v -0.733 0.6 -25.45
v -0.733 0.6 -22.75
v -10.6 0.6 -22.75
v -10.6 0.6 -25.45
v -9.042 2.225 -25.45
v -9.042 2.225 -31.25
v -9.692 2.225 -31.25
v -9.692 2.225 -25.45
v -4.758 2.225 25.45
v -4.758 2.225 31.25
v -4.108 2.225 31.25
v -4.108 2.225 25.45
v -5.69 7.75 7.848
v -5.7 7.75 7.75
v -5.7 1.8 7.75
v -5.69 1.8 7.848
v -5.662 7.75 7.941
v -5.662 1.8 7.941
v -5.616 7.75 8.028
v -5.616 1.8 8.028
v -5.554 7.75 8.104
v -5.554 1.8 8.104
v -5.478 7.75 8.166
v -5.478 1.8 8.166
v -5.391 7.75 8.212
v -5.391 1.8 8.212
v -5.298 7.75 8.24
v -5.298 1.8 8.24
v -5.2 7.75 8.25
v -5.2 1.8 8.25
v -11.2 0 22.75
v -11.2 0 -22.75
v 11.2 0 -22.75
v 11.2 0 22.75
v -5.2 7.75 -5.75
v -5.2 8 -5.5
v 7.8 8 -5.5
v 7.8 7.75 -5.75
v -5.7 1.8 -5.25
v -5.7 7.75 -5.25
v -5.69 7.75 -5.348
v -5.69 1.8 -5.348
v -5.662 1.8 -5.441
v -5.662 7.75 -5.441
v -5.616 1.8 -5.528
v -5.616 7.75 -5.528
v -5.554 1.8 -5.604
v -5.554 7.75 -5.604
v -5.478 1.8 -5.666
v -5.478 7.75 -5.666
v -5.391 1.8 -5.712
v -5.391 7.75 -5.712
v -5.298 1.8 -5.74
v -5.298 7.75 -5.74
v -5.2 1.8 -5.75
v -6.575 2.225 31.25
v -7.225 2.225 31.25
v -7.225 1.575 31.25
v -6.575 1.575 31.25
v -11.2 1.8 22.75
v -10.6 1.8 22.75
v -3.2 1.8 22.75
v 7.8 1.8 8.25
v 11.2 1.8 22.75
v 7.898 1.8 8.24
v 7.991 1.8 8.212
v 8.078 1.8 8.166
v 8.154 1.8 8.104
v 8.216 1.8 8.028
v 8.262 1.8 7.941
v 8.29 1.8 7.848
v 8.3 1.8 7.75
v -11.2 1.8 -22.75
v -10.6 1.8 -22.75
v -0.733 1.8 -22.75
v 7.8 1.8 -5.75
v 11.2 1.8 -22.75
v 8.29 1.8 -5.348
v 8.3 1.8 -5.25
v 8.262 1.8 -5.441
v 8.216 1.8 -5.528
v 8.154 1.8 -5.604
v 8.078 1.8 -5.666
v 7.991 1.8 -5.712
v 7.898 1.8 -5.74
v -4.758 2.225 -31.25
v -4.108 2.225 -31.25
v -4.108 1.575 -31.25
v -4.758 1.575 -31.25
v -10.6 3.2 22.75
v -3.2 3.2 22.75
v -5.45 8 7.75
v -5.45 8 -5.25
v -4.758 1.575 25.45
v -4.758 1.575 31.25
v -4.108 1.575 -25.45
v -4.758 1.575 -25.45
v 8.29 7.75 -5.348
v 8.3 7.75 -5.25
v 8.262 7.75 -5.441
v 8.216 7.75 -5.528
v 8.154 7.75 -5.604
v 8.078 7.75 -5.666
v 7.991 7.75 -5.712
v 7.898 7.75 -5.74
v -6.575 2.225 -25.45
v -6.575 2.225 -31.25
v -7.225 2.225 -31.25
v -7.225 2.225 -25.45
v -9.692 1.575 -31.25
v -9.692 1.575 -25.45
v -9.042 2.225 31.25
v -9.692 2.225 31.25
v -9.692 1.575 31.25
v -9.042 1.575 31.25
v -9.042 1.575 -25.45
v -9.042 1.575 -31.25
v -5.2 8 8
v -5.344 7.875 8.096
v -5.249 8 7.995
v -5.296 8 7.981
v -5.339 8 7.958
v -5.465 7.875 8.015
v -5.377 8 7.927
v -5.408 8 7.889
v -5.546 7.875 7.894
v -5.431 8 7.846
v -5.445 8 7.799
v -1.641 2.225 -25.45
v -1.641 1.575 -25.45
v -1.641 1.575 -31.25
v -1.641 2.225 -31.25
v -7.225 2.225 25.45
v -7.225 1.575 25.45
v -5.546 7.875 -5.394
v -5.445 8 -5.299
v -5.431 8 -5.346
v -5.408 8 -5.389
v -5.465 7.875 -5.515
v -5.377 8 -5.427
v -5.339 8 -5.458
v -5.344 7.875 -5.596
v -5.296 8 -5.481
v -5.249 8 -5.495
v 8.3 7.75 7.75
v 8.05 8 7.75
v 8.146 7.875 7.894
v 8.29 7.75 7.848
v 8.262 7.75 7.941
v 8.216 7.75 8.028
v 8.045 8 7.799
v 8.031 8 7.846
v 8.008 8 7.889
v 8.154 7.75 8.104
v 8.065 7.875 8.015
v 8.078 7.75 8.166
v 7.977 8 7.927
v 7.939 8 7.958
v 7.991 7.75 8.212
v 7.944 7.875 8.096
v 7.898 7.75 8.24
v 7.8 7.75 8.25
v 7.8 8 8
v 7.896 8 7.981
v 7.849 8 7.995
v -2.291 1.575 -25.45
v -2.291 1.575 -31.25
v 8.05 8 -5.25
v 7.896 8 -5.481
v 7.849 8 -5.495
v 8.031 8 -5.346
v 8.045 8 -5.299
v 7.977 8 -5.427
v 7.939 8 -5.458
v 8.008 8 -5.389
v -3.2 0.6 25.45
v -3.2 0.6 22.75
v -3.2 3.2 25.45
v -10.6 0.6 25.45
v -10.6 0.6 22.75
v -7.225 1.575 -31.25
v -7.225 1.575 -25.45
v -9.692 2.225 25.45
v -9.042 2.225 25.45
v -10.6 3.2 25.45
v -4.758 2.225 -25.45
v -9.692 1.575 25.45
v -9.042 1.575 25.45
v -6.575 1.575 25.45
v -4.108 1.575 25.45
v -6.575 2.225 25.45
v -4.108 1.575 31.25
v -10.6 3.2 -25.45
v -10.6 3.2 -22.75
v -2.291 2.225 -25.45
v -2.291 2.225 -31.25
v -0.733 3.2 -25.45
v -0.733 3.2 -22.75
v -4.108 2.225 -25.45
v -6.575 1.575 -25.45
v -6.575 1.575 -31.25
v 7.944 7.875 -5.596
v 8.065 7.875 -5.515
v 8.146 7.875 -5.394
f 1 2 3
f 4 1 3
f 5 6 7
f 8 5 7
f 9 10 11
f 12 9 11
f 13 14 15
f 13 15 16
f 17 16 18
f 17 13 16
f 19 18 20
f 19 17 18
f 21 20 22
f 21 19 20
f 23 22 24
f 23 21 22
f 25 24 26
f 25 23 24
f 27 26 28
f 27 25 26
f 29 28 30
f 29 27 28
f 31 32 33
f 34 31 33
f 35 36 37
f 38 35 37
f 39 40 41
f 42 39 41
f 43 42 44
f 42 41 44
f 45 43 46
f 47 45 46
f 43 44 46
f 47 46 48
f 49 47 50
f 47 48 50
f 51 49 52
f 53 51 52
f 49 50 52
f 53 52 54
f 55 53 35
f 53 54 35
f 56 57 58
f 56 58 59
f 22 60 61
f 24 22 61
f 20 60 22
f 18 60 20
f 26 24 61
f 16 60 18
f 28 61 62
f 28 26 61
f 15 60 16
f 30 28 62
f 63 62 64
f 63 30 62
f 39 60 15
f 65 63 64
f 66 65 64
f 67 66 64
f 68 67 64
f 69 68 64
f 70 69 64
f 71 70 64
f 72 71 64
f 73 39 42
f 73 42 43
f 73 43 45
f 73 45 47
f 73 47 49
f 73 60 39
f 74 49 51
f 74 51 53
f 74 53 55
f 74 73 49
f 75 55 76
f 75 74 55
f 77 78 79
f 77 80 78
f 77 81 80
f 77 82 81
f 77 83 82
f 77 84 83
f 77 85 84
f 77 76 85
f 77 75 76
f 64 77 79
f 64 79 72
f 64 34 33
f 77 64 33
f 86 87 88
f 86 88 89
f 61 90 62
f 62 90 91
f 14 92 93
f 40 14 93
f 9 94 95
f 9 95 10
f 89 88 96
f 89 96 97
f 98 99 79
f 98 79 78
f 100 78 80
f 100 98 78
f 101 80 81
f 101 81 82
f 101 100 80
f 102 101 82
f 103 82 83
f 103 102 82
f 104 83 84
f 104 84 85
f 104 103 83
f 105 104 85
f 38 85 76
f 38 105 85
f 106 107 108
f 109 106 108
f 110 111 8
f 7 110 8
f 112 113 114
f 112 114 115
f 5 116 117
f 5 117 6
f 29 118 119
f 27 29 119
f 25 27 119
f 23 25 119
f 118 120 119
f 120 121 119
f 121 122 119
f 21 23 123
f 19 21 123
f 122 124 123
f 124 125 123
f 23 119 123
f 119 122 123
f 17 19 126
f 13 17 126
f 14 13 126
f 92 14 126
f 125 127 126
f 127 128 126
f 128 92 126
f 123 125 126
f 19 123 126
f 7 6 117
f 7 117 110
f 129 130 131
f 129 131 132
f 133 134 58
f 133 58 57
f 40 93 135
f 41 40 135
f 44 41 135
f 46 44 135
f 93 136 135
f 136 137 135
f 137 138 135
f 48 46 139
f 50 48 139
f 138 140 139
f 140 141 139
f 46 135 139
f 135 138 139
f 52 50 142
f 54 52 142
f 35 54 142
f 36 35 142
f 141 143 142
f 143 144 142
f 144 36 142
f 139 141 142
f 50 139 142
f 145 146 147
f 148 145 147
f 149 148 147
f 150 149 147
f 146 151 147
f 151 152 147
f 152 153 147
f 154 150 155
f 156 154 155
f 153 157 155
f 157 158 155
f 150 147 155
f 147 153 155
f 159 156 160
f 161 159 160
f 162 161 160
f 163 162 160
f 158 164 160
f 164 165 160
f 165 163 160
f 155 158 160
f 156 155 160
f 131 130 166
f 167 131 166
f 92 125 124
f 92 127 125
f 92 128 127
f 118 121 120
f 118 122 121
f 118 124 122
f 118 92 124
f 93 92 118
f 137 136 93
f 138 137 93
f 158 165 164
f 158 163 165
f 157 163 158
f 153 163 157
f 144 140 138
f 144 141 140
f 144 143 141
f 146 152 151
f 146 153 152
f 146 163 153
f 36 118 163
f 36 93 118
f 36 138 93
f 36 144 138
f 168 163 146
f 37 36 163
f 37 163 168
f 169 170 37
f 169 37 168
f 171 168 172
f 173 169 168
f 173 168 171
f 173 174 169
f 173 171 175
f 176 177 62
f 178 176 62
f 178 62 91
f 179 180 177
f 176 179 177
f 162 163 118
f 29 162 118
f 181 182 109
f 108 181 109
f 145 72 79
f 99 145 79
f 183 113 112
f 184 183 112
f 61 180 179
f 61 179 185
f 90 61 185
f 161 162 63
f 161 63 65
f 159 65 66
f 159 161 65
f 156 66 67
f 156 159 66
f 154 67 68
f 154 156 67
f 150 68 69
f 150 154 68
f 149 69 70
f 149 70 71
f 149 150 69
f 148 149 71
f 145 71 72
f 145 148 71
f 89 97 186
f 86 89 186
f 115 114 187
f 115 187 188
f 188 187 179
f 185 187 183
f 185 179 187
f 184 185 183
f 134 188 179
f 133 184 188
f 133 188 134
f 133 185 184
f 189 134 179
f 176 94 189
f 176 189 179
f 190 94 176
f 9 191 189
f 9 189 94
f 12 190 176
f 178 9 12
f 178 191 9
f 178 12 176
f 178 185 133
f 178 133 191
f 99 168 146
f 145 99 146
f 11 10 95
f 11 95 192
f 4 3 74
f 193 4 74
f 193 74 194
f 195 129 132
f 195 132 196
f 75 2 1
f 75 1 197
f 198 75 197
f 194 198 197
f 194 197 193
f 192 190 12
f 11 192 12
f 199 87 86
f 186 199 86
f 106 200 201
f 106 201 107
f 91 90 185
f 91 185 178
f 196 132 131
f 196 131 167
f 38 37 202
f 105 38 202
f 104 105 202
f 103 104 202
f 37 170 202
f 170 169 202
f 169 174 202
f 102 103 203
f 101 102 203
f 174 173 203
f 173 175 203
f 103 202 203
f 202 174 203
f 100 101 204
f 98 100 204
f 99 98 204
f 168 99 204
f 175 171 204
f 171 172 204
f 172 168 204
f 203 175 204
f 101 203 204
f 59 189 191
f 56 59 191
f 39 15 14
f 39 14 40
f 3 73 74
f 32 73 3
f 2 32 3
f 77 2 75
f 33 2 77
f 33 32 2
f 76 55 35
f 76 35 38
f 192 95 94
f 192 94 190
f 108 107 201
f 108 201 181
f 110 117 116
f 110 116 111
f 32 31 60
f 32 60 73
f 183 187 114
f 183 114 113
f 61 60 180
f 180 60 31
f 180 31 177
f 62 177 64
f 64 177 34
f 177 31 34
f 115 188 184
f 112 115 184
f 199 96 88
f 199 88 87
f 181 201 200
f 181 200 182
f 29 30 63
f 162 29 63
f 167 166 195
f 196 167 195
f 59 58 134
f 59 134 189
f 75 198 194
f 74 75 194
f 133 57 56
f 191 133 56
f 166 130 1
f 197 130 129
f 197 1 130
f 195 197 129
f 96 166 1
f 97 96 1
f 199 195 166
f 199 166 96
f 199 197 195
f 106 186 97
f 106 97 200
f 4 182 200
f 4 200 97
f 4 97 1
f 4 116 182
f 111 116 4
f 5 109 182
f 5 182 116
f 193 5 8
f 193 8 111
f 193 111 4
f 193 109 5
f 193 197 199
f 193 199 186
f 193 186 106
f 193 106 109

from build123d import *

# Parameters (mm, degrees)
SKETCH1_W           = 22.4
SKETCH1_H           = 45.5
BOSS_EXTRUDE1_DEPTH = 1.8
BOSS_EXTRUDE2_START = -1.8
SKETCH2_W           = 14
SKETCH2_H           = 14
BOSS_EXTRUDE2_DEPTH = 8
SKETCH3_W           = 7.4
SKETCH3_H           = 2.6
BOSS_EXTRUDE3_DEPTH = 2.7
SKETCH4_W           = 0.65
SKETCH4_H           = 0.65
BOSS_EXTRUDE4_DEPTH = 5.8
SKETCH6_W           = 9.867
SKETCH6_H           = 2.6
BOSS_EXTRUDE5_DEPTH = 2.7
SKETCH7_W           = 0.65
SKETCH7_H           = 0.65
BOSS_EXTRUDE6_DEPTH = 5.8
FILLET1_R           = 0.5
CHAMFER1_SIZE       = 0.25


with BuildPart() as part:
    # Sketch1 → Boss-Extrude1 (new body)
    with BuildSketch(Plane(origin=(0, 0, 0), x_dir=(1, 0, 0), z_dir=(0, 1, 0))):
        Rectangle(SKETCH1_W, SKETCH1_H)
    extrude(amount=BOSS_EXTRUDE1_DEPTH)

    # Sketch2 → Boss-Extrude2 (add)
    with BuildSketch(Plane(origin=(0, 1.8, 0), x_dir=(1, 0, 0), z_dir=(0, 1, 0)).offset(BOSS_EXTRUDE2_START)):
        with Locations((1.3, -1.25)):
            Rectangle(SKETCH2_W, SKETCH2_H)
    extrude(amount=BOSS_EXTRUDE2_DEPTH)

    # Sketch3 → Boss-Extrude3 (add)
    with BuildSketch(Plane.XY.offset(22.75)):
        with Locations((-6.9, 1.9)):
            Rectangle(SKETCH3_W, SKETCH3_H)
    extrude(amount=BOSS_EXTRUDE3_DEPTH)

    # Sketch4 → Boss-Extrude4 (add)
    with BuildSketch(Plane.XY.offset(25.45)):
        with Locations((-9.366666667, 1.9)):
            Rectangle(SKETCH4_W, SKETCH4_H)
        with Locations((-6.9, 1.9)):
            Rectangle(SKETCH4_W, SKETCH4_H)
        with Locations((-4.433333333, 1.9)):
            Rectangle(SKETCH4_W, SKETCH4_H)
    extrude(amount=BOSS_EXTRUDE4_DEPTH)

    # Sketch6 → Boss-Extrude5 (add)
    with BuildSketch(Plane(origin=(0, 0, -22.75), x_dir=(-1, 0, 0), z_dir=(0, 0, -1))):
        with Locations((5.6665, 1.9)):
            Rectangle(SKETCH6_W, SKETCH6_H)
    extrude(amount=BOSS_EXTRUDE5_DEPTH)

    # Sketch7 → Boss-Extrude6 (add)
    with BuildSketch(Plane(origin=(0, 0, -25.45), x_dir=(-1, 0, 0), z_dir=(0, 0, -1))):
        with Locations((1.966375, 1.9)):
            Rectangle(SKETCH7_W, SKETCH7_H)
        with Locations((4.433125, 1.9)):
            Rectangle(SKETCH7_W, SKETCH7_H)
        with Locations((6.899875, 1.9)):
            Rectangle(SKETCH7_W, SKETCH7_H)
        with Locations((9.366625, 1.9)):
            Rectangle(SKETCH7_W, SKETCH7_H)
    extrude(amount=BOSS_EXTRUDE6_DEPTH)

    # Fillet1
    fillet1_edges = [part.edges().sort_by_distance(p)[0] for p in [
        (8.3, 4.9, 8.25),
        (8.3, 4.9, -5.75),
        (-5.7, 4.9, -5.75),
        (-5.7, 4.9, 8.25),
    ]]
    fillet(fillet1_edges, radius=FILLET1_R)

    # Chamfer1
    chamfer1_edges = [part.edges().sort_by_distance(p)[0] for p in [
        (-5.7, 8, 1.25),
        (1.3, 8, -5.75),
        (8.3, 8, 1.25),
        (1.3, 8, 8.25),
        (-5.553553391, 8, 8.103553391),
        (8.153553391, 8, 8.103553391),
        (8.153553391, 8, -5.603553391),
        (-5.553553391, 8, -5.603553391),
    ]]
    chamfer(chamfer1_edges, length=CHAMFER1_SIZE)


solid = part.part
